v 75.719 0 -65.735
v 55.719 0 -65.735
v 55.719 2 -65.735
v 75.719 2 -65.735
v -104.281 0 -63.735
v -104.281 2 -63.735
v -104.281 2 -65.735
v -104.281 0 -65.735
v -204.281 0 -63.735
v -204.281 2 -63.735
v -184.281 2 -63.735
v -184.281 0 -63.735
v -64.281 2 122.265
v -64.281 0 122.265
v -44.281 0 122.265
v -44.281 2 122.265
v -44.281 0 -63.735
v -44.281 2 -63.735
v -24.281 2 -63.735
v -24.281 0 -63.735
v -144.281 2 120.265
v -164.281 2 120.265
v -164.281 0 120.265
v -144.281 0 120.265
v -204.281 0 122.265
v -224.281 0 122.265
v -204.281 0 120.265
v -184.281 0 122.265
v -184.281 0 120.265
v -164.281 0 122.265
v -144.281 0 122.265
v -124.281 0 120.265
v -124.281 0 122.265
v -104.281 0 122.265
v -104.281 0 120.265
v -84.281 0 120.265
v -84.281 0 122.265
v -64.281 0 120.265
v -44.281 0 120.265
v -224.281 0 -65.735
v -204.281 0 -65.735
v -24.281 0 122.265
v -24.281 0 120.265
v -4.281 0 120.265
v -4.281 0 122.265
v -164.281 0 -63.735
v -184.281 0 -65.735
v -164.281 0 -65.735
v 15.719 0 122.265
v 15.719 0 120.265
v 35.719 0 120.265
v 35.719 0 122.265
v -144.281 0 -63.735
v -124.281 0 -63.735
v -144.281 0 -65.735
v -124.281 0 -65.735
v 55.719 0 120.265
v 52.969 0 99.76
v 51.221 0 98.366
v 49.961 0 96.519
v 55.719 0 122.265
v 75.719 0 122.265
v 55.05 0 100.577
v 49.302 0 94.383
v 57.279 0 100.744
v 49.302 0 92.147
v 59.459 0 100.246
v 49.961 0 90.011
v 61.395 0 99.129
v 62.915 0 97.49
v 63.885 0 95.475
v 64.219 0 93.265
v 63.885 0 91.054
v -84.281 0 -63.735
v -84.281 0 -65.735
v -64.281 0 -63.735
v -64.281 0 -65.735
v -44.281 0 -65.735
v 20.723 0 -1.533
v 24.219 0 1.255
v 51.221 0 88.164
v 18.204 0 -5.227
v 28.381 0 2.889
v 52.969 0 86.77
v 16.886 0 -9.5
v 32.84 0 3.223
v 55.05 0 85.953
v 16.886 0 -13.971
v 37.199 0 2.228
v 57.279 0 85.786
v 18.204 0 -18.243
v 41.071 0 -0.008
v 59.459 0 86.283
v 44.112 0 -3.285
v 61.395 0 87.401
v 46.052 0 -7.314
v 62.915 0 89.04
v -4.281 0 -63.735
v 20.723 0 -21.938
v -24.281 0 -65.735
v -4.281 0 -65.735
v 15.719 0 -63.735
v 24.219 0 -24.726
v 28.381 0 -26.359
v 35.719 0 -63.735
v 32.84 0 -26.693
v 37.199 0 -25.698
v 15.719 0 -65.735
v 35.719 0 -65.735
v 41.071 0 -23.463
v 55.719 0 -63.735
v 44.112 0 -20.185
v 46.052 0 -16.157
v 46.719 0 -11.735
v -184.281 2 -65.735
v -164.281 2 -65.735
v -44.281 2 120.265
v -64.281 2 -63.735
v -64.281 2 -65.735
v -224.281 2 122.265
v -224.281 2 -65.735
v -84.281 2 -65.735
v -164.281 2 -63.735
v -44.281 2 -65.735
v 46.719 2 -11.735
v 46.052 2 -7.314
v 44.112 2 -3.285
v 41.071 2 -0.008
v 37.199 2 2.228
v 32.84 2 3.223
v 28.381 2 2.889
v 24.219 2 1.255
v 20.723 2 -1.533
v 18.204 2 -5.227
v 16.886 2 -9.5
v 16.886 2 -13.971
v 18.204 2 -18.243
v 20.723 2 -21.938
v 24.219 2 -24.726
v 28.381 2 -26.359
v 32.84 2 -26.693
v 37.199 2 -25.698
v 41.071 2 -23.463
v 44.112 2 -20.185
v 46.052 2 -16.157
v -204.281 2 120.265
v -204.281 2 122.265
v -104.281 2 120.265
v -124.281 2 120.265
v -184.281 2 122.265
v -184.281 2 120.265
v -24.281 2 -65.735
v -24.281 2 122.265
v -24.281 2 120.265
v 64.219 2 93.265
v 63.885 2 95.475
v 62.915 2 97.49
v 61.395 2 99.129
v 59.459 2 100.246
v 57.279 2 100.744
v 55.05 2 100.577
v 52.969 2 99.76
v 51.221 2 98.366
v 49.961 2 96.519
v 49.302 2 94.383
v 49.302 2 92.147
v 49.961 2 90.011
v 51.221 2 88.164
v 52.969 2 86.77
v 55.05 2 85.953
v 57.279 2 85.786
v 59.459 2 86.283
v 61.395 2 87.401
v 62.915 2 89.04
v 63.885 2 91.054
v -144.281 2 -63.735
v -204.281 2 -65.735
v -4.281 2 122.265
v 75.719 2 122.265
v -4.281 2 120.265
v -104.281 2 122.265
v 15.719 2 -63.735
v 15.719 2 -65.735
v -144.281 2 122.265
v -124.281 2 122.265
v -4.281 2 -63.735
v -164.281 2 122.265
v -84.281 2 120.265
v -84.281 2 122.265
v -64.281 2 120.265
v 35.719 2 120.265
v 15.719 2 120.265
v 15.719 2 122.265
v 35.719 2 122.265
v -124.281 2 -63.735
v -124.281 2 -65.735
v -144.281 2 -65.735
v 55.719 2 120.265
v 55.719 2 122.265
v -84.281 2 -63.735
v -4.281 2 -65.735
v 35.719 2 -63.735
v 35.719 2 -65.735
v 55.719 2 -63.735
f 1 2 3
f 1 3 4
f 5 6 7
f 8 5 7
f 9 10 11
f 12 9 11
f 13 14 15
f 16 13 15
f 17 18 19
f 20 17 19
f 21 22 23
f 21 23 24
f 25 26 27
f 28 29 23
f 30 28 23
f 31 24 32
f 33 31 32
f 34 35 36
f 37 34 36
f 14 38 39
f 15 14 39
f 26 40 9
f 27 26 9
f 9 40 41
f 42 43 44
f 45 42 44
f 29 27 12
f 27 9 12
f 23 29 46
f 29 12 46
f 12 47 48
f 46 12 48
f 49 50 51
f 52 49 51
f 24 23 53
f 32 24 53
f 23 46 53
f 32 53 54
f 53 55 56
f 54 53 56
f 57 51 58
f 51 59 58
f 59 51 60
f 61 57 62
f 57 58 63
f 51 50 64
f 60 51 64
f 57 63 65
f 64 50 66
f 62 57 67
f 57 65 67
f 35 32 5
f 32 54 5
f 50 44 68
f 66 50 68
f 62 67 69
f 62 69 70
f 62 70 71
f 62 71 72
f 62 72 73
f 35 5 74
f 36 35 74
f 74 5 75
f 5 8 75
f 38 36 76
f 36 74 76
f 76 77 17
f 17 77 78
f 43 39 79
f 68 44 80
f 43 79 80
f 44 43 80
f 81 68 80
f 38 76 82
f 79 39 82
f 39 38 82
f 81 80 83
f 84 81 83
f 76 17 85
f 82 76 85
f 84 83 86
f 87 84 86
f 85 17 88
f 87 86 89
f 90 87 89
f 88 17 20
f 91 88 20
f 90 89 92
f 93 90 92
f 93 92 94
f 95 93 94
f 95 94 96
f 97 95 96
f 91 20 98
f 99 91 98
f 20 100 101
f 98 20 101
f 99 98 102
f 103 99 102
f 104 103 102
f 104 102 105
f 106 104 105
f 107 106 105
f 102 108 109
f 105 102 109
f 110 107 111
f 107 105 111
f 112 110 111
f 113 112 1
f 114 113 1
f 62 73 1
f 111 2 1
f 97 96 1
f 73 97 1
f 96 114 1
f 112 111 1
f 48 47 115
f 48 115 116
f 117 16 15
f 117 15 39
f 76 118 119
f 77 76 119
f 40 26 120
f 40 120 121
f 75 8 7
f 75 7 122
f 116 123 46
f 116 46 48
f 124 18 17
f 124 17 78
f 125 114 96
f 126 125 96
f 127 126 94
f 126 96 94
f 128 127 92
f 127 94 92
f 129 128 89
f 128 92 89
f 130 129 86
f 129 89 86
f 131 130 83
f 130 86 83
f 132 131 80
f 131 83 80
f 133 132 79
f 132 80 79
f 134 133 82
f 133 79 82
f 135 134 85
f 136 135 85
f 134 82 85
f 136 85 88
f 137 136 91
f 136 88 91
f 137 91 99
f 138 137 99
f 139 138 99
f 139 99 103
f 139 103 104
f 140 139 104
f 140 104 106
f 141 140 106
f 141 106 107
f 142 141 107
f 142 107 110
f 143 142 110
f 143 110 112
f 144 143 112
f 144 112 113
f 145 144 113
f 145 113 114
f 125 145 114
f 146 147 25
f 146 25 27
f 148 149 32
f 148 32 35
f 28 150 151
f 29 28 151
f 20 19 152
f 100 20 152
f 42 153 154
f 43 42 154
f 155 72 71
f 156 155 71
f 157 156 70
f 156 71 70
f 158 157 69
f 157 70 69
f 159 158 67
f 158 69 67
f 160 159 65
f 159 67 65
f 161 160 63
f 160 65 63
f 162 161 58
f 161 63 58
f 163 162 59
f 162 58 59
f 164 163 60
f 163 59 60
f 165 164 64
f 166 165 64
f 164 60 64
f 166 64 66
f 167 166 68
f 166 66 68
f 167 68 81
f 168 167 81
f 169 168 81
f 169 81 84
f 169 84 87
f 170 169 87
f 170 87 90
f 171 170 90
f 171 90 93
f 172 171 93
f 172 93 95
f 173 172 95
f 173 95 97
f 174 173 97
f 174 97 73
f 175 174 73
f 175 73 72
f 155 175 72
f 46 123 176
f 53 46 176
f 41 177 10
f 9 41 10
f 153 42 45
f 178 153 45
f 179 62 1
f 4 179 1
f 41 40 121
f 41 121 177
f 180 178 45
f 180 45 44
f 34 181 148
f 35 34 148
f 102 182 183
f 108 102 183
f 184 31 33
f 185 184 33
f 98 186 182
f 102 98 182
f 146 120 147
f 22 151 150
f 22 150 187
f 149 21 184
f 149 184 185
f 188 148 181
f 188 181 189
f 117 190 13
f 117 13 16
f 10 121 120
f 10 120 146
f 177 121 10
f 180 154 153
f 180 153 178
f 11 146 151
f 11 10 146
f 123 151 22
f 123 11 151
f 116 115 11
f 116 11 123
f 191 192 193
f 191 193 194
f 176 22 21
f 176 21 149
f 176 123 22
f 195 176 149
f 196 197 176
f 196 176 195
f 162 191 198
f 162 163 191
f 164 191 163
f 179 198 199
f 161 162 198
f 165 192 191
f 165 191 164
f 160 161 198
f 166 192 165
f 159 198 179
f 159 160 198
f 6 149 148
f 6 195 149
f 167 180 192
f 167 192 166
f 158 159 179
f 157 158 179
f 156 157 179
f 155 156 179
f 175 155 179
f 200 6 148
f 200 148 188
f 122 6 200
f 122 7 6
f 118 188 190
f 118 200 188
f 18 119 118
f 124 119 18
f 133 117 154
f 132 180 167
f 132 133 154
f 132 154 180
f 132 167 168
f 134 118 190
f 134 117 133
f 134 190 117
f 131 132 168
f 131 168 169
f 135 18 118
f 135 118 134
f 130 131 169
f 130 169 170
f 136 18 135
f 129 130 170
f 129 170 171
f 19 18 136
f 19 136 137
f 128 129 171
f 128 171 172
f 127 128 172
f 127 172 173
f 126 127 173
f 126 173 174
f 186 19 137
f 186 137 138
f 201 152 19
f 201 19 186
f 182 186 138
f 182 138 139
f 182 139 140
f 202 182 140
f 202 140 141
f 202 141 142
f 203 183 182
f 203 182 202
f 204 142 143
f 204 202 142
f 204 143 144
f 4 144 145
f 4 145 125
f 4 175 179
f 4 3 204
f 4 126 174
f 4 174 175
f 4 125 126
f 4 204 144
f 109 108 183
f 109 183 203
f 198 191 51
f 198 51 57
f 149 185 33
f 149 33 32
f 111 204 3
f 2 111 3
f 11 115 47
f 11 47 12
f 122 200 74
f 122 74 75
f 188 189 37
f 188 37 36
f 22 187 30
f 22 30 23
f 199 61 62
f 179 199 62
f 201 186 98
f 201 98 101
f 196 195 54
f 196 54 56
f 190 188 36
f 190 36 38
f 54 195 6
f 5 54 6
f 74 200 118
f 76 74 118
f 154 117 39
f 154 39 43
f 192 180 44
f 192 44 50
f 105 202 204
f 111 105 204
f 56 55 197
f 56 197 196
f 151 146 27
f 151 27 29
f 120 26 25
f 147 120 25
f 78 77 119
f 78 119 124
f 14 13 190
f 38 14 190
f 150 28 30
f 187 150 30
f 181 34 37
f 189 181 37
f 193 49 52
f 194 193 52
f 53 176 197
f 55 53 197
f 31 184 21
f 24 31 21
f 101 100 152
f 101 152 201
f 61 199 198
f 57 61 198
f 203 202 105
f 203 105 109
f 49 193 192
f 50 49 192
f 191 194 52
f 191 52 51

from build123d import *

# Parameters (mm, degrees)
SKETCH1_W               = 300
SKETCH1_H               = 188
BOSS_EXTRUDE1_DEPTH     = 2
SKETCH2_W               = 20
SKETCH2_H               = 2
CUT_EXTRUDE1_DEPTH      = 4
LPATTERN1_COUNT         = 8
LPATTERN1_PITCH         = 40
MIRROR1_COPY_1_SKETCH_W = 20
MIRROR1_COPY_1_SKETCH_H = 2
MIRROR1_COPY_1_DEPTH    = 4
MIRROR1_COPY_2_SKETCH_W = 20
MIRROR1_COPY_2_SKETCH_H = 2
MIRROR1_COPY_2_DEPTH    = 4
MIRROR1_COPY_3_SKETCH_W = 20
MIRROR1_COPY_3_SKETCH_H = 2
MIRROR1_COPY_3_DEPTH    = 4
MIRROR1_COPY_4_SKETCH_W = 20
MIRROR1_COPY_4_SKETCH_H = 2
MIRROR1_COPY_4_DEPTH    = 4
MIRROR1_COPY_5_SKETCH_W = 20
MIRROR1_COPY_5_SKETCH_H = 2
MIRROR1_COPY_5_DEPTH    = 4
MIRROR1_COPY_6_SKETCH_W = 20
MIRROR1_COPY_6_SKETCH_H = 2
MIRROR1_COPY_6_DEPTH    = 4
MIRROR1_COPY_7_SKETCH_W = 20
MIRROR1_COPY_7_SKETCH_H = 2
MIRROR1_COPY_7_DEPTH    = 4
SKETCH4_R               = 7.5
SKETCH4_R_2             = 15
CUT_EXTRUDE2_DEPTH      = 3


with BuildPart() as part:
    # Sketch1 → Boss-Extrude1 (new body)
    with BuildSketch(Plane(origin=(0, 0, 0), x_dir=(1, 0, 0), z_dir=(0, 1, 0))):
        with Locations((-74.28137931, -28.264827586)):
            Rectangle(SKETCH1_W, SKETCH1_H)
    extrude(amount=BOSS_EXTRUDE1_DEPTH)

    # Sketch2 → Cut-Extrude1 (cut)
    with BuildSketch(Plane(origin=(0, 2, 0), x_dir=(1, 0, 0), z_dir=(0, 1, 0))):
        with Locations((-194.28137931, -121.264827586)):
            Rectangle(SKETCH2_W, SKETCH2_H)
    cut_extrude1 = extrude(amount=-CUT_EXTRUDE1_DEPTH, mode=Mode.SUBTRACT)

    # LPattern1: Cut-Extrude1 ×8
    with Locations(*[(i * LPATTERN1_PITCH, 0, 0) for i in range(1, LPATTERN1_COUNT)]):
        add(cut_extrude1, mode=Mode.SUBTRACT)

    # Mirror1: Cut-Extrude1 across plane
    add(cut_extrude1.mirror(Plane.XY.offset(28.264827586)), mode=Mode.SUBTRACT)

    # Mirror1 copy 1 sketch → Mirror1 copy 1 (cut)
    with BuildSketch(Plane(origin=(40, 2, 56.529655172), x_dir=(1, 0, 0), z_dir=(0, 1, 0))):
        with Locations((-194.28137931, 121.264827586)):
            Rectangle(MIRROR1_COPY_1_SKETCH_W, MIRROR1_COPY_1_SKETCH_H)
    extrude(amount=-MIRROR1_COPY_1_DEPTH, mode=Mode.SUBTRACT)

    # Mirror1 copy 2 sketch → Mirror1 copy 2 (cut)
    with BuildSketch(Plane(origin=(80, 2, 56.529655172), x_dir=(1, 0, 0), z_dir=(0, 1, 0))):
        with Locations((-194.28137931, 121.264827586)):
            Rectangle(MIRROR1_COPY_2_SKETCH_W, MIRROR1_COPY_2_SKETCH_H)
    extrude(amount=-MIRROR1_COPY_2_DEPTH, mode=Mode.SUBTRACT)

    # Mirror1 copy 3 sketch → Mirror1 copy 3 (cut)
    with BuildSketch(Plane(origin=(120, 2, 56.529655172), x_dir=(1, 0, 0), z_dir=(0, 1, 0))):
        with Locations((-194.28137931, 121.264827586)):
            Rectangle(MIRROR1_COPY_3_SKETCH_W, MIRROR1_COPY_3_SKETCH_H)
    extrude(amount=-MIRROR1_COPY_3_DEPTH, mode=Mode.SUBTRACT)

    # Mirror1 copy 4 sketch → Mirror1 copy 4 (cut)
    with BuildSketch(Plane(origin=(160, 2, 56.529655172), x_dir=(1, 0, 0), z_dir=(0, 1, 0))):
        with Locations((-194.28137931, 121.264827586)):
            Rectangle(MIRROR1_COPY_4_SKETCH_W, MIRROR1_COPY_4_SKETCH_H)
    extrude(amount=-MIRROR1_COPY_4_DEPTH, mode=Mode.SUBTRACT)

    # Mirror1 copy 5 sketch → Mirror1 copy 5 (cut)
    with BuildSketch(Plane(origin=(200, 2, 56.529655172), x_dir=(1, 0, 0), z_dir=(0, 1, 0))):
        with Locations((-194.28137931, 121.264827586)):
            Rectangle(MIRROR1_COPY_5_SKETCH_W, MIRROR1_COPY_5_SKETCH_H)
    extrude(amount=-MIRROR1_COPY_5_DEPTH, mode=Mode.SUBTRACT)

    # Mirror1 copy 6 sketch → Mirror1 copy 6 (cut)
    with BuildSketch(Plane(origin=(240, 2, 56.529655172), x_dir=(1, 0, 0), z_dir=(0, 1, 0))):
        with Locations((-194.28137931, 121.264827586)):
            Rectangle(MIRROR1_COPY_6_SKETCH_W, MIRROR1_COPY_6_SKETCH_H)
    extrude(amount=-MIRROR1_COPY_6_DEPTH, mode=Mode.SUBTRACT)

    # Mirror1 copy 7 sketch → Mirror1 copy 7 (cut)
    with BuildSketch(Plane(origin=(280, 2, 56.529655172), x_dir=(1, 0, 0), z_dir=(0, 1, 0))):
        with Locations((-194.28137931, 121.264827586)):
            Rectangle(MIRROR1_COPY_7_SKETCH_W, MIRROR1_COPY_7_SKETCH_H)
    extrude(amount=-MIRROR1_COPY_7_DEPTH, mode=Mode.SUBTRACT)

    # Sketch4 → Cut-Extrude2 (cut, through all)
    with BuildSketch(Plane.XZ):
        with Locations((56.71862069, 93.264827586)):
            Circle(SKETCH4_R)
        with Locations((31.71862069, -11.735172414)):
            Circle(SKETCH4_R_2)
    extrude(amount=-CUT_EXTRUDE2_DEPTH, mode=Mode.SUBTRACT)


solid = part.part
